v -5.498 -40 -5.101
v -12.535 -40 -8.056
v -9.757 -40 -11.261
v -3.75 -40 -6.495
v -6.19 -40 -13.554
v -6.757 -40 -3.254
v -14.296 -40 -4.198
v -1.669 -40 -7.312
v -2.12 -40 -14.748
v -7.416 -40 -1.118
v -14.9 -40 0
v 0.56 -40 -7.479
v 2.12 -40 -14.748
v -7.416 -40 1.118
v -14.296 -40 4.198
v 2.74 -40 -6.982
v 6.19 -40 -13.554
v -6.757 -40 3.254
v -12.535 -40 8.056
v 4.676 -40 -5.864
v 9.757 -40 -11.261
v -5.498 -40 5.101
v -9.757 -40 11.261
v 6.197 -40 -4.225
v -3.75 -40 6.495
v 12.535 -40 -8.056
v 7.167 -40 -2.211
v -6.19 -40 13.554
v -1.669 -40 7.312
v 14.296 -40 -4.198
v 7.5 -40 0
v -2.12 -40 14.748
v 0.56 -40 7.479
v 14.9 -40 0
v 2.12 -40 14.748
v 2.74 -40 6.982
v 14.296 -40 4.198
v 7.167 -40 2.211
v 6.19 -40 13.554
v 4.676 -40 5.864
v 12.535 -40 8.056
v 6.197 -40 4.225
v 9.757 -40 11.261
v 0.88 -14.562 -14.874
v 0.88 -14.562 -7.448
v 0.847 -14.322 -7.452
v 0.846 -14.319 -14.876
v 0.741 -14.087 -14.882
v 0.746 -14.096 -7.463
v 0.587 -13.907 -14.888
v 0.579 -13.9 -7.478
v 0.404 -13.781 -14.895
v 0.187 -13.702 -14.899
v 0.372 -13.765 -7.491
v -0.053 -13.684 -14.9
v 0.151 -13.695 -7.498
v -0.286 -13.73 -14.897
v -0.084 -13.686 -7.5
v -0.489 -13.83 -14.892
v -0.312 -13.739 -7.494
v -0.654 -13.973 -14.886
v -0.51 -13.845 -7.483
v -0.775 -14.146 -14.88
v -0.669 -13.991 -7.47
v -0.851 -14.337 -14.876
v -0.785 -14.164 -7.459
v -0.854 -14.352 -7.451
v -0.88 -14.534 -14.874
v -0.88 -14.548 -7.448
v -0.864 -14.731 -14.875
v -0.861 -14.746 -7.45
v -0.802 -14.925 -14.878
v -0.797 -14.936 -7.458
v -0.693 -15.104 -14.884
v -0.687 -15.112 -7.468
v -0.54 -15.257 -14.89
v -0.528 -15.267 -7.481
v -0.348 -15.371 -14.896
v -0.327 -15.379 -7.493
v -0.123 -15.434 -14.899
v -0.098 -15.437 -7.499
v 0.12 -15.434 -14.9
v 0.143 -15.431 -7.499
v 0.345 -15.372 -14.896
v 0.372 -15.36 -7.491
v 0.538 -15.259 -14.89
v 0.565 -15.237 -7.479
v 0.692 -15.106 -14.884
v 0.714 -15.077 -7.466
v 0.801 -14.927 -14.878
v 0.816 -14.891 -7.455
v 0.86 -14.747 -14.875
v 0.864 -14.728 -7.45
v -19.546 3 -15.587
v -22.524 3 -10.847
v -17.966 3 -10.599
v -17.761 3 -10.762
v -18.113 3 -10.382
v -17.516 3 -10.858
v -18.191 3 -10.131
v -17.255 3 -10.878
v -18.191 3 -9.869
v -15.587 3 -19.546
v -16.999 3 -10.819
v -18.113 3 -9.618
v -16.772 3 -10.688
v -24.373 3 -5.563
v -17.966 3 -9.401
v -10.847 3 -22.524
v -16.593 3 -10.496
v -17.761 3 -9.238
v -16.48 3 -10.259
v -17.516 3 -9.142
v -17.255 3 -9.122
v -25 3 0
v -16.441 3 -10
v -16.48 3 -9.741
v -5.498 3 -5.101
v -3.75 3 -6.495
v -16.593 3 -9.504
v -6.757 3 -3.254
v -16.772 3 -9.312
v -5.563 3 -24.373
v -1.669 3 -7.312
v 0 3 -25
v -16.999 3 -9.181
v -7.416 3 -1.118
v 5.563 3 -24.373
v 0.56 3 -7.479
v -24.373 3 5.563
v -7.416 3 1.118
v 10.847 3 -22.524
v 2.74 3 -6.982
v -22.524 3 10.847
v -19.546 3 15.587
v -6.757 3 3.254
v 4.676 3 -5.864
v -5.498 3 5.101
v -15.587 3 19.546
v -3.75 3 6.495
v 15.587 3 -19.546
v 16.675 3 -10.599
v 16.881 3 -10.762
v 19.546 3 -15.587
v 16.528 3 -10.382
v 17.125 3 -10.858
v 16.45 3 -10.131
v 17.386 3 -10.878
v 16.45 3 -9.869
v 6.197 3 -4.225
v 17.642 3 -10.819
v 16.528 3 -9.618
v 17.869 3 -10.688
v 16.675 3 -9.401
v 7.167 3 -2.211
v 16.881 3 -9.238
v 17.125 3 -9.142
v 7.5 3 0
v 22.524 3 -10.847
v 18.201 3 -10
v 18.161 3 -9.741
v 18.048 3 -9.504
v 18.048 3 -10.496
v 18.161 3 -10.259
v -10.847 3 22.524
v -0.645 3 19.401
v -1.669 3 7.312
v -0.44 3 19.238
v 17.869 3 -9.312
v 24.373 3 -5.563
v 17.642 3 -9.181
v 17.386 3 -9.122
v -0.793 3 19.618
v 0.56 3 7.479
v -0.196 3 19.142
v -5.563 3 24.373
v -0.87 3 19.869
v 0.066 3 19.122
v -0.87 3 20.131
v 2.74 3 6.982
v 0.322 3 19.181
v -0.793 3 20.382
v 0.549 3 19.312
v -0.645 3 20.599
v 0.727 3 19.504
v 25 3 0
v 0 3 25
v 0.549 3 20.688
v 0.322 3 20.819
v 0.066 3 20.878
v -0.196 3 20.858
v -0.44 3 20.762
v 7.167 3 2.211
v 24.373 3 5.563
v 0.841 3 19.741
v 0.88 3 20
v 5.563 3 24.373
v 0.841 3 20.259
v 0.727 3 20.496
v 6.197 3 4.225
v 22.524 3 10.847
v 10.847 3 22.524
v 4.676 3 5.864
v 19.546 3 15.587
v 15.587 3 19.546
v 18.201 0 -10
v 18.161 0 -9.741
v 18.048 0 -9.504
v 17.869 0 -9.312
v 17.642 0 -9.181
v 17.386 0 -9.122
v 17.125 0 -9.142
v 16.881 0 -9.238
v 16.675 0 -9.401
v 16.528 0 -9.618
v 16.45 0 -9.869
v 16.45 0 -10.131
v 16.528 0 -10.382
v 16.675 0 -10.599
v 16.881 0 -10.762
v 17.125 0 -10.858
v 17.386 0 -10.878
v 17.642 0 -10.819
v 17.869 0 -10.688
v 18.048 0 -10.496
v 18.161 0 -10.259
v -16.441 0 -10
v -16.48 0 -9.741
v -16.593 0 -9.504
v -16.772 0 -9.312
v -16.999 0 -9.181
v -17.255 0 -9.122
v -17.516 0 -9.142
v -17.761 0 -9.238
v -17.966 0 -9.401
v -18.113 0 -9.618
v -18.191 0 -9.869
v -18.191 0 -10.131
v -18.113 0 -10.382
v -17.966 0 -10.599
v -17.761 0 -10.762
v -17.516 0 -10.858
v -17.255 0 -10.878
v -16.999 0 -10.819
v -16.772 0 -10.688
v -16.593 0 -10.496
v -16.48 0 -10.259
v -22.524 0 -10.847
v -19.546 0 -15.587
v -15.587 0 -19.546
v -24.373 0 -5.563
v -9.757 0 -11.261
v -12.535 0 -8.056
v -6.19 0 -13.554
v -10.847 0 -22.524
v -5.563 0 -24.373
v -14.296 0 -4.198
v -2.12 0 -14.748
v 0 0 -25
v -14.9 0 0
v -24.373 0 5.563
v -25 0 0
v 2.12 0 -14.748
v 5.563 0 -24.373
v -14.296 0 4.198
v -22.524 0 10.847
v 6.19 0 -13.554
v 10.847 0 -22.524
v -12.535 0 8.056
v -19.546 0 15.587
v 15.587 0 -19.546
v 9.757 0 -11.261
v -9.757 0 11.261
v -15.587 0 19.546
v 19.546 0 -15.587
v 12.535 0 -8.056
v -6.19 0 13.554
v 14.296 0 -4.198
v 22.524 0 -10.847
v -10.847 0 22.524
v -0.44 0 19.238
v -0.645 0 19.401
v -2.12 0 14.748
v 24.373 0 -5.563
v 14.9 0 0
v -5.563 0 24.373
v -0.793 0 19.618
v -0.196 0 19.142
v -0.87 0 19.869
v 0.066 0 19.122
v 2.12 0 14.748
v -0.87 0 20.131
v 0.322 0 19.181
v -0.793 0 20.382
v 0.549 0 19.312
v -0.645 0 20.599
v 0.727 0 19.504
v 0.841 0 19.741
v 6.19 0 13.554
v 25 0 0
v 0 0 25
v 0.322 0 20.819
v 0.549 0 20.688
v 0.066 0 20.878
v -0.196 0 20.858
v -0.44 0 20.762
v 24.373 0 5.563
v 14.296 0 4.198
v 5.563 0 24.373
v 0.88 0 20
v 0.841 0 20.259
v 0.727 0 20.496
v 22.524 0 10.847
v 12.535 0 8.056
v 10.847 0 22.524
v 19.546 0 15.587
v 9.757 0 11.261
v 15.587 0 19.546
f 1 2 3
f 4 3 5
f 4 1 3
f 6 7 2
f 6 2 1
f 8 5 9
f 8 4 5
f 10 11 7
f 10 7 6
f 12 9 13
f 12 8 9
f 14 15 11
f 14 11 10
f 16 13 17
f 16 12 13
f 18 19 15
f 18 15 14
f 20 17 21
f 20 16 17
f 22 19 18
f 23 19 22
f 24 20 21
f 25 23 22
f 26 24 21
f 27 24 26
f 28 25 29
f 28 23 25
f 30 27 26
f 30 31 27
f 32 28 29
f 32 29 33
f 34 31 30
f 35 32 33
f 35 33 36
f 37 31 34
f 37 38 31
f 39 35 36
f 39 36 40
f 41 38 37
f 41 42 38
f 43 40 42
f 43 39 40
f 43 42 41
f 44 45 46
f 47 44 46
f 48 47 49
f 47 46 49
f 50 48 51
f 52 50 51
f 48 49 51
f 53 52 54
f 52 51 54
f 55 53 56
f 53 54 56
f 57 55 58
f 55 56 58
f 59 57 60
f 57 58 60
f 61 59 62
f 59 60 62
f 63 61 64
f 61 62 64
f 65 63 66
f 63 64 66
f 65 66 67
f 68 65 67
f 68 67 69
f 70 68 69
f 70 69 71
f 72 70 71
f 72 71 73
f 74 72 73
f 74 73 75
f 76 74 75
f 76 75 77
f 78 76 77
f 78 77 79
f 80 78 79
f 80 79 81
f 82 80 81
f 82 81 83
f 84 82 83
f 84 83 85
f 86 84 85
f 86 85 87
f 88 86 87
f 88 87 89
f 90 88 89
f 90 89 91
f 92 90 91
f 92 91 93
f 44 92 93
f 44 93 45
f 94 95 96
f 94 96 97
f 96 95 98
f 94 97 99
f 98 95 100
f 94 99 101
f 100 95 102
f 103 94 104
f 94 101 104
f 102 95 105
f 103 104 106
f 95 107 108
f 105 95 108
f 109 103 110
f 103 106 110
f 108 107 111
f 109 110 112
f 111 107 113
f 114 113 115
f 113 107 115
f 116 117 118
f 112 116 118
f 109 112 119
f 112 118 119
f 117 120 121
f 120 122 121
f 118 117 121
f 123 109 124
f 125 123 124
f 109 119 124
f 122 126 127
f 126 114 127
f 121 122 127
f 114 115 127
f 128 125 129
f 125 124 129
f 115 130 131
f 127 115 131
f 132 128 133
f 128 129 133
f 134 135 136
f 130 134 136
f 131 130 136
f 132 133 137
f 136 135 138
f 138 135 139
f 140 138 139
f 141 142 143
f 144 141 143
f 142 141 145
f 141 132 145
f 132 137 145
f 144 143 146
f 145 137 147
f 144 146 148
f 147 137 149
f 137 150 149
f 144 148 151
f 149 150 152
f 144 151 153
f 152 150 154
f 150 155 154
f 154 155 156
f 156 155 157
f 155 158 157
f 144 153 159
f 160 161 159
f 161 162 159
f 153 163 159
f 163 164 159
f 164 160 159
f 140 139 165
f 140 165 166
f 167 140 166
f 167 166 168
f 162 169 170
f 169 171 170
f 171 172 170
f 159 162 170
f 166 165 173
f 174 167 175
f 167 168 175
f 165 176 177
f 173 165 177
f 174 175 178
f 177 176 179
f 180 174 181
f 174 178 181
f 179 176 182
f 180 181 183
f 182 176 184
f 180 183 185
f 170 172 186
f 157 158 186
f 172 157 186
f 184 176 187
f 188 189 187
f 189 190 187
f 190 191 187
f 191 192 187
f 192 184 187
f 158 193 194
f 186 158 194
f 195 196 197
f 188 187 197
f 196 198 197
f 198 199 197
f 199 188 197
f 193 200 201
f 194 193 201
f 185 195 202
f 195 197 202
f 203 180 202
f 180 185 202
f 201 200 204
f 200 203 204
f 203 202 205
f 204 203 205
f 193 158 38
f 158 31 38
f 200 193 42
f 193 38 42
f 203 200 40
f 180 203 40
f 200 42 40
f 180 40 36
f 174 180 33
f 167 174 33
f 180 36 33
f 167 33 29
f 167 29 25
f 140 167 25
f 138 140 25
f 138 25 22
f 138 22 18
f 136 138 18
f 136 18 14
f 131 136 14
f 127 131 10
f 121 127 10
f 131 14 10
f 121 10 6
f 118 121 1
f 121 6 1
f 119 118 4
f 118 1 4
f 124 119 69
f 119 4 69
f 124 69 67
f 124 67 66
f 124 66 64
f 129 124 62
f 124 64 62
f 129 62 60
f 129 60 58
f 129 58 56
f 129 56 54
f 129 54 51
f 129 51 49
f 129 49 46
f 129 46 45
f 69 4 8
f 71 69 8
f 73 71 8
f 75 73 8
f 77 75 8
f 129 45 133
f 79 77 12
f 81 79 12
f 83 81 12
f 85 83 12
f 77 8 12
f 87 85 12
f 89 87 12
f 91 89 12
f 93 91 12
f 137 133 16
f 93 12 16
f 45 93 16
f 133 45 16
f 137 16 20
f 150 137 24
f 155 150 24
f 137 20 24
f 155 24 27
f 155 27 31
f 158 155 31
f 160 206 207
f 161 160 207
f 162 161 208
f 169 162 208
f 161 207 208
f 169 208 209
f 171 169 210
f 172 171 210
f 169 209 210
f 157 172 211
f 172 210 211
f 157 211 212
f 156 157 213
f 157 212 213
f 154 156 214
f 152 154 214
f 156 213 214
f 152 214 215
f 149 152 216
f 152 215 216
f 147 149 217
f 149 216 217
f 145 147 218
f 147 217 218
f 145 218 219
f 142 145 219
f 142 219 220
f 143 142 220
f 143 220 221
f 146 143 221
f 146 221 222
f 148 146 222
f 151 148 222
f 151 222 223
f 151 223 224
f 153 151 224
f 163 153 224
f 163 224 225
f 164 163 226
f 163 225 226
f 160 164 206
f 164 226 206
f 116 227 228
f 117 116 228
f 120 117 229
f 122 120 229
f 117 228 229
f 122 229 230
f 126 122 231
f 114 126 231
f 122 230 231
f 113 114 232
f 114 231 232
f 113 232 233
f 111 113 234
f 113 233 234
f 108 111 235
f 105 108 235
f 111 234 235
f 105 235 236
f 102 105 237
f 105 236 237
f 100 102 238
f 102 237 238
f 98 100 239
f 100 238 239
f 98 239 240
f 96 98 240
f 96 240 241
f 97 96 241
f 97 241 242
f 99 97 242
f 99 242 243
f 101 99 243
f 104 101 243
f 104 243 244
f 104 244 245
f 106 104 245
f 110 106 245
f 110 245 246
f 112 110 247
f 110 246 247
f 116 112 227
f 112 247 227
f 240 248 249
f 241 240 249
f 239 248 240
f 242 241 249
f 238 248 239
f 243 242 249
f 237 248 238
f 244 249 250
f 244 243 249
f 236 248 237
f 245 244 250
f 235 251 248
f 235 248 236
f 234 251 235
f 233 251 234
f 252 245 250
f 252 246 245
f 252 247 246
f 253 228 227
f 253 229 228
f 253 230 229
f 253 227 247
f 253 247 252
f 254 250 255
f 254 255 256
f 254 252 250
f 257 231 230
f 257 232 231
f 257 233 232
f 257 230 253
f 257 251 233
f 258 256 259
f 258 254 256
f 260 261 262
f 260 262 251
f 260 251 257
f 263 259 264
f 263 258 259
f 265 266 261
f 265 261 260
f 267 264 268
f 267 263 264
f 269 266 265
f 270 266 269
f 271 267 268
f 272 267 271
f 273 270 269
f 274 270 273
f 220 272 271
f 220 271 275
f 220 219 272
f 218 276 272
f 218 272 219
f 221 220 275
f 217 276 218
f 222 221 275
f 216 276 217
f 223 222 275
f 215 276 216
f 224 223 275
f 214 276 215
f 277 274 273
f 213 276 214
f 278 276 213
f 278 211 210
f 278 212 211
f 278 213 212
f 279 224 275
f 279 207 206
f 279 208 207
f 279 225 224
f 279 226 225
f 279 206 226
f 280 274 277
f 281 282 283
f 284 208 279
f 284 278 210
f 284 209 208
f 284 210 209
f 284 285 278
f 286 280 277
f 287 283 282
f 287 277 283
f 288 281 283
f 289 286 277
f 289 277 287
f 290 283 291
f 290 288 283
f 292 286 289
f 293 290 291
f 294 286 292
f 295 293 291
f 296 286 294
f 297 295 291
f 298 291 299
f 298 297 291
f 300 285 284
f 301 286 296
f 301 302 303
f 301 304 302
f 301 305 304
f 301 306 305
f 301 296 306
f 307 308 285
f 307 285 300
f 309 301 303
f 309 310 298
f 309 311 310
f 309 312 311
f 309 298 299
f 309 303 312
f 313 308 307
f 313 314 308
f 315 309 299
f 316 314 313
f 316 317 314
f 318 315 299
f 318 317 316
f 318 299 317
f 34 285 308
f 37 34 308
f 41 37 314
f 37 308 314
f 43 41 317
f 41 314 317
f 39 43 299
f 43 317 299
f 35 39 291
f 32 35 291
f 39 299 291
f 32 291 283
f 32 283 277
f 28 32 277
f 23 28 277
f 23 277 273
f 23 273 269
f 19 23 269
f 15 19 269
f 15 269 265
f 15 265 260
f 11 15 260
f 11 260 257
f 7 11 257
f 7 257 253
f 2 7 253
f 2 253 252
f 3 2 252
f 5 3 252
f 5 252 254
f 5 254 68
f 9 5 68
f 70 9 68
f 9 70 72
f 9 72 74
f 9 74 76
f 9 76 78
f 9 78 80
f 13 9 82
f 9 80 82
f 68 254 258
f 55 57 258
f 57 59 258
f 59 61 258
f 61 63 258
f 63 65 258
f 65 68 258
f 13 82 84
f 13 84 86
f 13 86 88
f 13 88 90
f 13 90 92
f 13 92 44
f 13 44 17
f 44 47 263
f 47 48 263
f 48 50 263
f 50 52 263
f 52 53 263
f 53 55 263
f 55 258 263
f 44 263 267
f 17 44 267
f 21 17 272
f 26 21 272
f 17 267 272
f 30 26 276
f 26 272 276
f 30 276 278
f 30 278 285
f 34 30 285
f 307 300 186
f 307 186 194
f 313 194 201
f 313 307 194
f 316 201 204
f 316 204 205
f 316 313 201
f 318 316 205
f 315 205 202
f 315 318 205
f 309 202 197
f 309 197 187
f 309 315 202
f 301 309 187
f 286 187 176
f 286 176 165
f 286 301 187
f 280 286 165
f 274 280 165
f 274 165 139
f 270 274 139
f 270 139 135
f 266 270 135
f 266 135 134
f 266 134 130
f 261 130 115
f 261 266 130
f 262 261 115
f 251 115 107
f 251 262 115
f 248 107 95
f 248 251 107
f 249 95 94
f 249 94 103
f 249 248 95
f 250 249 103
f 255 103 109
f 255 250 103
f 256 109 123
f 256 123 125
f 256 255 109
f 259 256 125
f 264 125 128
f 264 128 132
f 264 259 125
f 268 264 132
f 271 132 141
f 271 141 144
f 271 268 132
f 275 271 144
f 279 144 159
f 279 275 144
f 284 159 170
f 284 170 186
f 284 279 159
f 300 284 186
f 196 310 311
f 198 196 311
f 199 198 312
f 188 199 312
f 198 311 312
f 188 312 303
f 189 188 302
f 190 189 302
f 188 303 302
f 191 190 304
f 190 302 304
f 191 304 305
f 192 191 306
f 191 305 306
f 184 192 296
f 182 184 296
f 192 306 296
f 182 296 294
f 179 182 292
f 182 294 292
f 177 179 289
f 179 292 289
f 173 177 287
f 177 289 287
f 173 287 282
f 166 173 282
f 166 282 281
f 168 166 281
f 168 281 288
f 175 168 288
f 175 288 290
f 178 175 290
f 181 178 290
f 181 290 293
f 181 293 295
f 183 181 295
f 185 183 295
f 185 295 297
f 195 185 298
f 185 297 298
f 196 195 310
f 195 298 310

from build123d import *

# Parameters (mm, degrees)
F0_R     = 14.9
F0_R_2   = 7.5
F1_DEPTH = 40
F0_R_3   = 25
F0_R_4   = 0.88
F2_DEPTH = 3
F3_R     = 0.88
F4_DEPTH = 25


with BuildPart() as f1:
    # F0 (on Front) → F1 (new body)
    with BuildSketch(Plane.XZ):
        Circle(F0_R)
        Circle(F0_R_2, mode=Mode.SUBTRACT)
    extrude(amount=F1_DEPTH)

    # F0 (on Front) → F2 (join)
    with BuildSketch(Plane.XZ):
        Circle(F0_R_3)
        with Locations((-17.320508, -10)):
            Circle(F0_R_4, mode=Mode.SUBTRACT)
        with Locations((17.320508, -10)):
            Circle(F0_R_4, mode=Mode.SUBTRACT)
        Circle(F0_R, mode=Mode.SUBTRACT)
        with Locations((0, 20)):
            Circle(F0_R_4, mode=Mode.SUBTRACT)
        Circle(F0_R)
        Circle(F0_R_2, mode=Mode.SUBTRACT)
    extrude(amount=-F2_DEPTH)

    # F3 (on Top) → F4 (cut)
    with BuildSketch(Plane.XY):
        with Locations((0, -14.562329)):
            Circle(F3_R)
    extrude(amount=-F4_DEPTH, mode=Mode.SUBTRACT)


solid = f1.part
